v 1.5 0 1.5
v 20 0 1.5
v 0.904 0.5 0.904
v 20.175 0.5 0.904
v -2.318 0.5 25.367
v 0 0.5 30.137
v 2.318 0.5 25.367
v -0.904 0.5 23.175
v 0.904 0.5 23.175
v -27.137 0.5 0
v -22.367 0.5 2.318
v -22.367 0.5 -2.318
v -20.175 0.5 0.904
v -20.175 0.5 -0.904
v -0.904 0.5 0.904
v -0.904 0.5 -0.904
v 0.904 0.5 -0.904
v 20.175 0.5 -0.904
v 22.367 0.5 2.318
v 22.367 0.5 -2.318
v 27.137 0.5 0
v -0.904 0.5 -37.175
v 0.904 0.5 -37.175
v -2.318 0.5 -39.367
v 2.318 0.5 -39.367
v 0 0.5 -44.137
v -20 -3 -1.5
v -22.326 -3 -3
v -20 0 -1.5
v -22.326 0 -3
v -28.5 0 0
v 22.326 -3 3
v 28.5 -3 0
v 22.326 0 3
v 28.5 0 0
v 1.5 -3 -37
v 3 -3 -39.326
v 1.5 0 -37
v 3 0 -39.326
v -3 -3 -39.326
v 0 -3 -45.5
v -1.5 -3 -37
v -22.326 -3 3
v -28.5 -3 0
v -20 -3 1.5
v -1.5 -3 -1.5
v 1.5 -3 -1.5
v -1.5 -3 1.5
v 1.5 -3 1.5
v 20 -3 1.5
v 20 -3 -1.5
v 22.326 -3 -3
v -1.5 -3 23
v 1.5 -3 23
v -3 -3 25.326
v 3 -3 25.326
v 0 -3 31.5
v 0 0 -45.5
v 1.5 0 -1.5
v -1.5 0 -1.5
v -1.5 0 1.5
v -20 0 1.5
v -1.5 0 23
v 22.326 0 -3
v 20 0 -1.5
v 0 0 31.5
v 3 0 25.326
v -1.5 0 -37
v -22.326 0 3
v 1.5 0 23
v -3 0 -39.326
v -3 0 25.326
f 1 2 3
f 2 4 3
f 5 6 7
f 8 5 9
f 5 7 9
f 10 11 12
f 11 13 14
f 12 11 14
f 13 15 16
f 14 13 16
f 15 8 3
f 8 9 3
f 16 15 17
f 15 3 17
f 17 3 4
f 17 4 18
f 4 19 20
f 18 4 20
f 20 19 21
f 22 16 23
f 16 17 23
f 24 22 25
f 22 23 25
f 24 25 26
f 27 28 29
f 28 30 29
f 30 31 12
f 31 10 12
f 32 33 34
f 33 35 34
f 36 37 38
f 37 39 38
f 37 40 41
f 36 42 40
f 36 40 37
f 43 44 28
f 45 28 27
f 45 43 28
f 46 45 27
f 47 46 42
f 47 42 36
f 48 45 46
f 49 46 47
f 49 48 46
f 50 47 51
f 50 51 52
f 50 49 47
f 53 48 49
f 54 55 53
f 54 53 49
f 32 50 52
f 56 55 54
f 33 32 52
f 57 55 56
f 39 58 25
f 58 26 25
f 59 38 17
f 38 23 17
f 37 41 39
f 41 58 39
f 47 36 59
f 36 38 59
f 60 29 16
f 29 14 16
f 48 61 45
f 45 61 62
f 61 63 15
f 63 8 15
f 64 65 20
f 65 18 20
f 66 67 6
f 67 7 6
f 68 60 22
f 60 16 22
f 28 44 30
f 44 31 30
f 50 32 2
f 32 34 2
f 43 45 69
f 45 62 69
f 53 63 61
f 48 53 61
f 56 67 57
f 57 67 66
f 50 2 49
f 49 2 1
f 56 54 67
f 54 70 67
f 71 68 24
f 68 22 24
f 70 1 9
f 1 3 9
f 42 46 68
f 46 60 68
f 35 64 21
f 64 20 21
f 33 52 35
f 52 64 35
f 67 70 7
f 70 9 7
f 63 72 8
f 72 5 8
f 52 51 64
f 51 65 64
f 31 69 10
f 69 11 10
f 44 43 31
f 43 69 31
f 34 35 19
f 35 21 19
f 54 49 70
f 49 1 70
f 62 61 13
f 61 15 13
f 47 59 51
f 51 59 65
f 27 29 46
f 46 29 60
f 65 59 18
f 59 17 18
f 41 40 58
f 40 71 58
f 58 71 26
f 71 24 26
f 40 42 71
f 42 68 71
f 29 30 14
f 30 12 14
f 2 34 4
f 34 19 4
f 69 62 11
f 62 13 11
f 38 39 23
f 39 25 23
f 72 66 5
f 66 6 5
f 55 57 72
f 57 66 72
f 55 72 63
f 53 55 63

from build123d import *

# Parameters (mm, degrees)
F1_DEPTH = 1.5
F2_DEPTH = 0.5
F2_TAPER = 50
F3_DEPTH = 1.5


with BuildPart() as f1:
    # F0 (on Front) → F1 (new body)
    with BuildSketch(Plane.XZ):
        Polygon((-1.5, 1.5), (-20, 1.5), (-22.3259367049, 3), (-28.5, 0), (-22.3259367049, -3), (-20, -1.5), (-1.5, -1.5), (-1.5, -37), (-3, -39.3259400742), (0, -45.5), (3, -39.3259400742), (1.5, -37), (1.5, -1.5), (20, -1.5), (22.3259367049, -3), (28.5, 0), (22.3259367049, 3), (20, 1.5), (1.5, 1.5), (1.5, 23), (3, 25.3259400742), (0, 31.5), (-3, 25.3259400742), (-1.5, 23), align=None)
        Polygon((-1, -1), (-1.5, -1), (-20, -1), (-22.3259367049, -2.5), (-27.4709894508, 0), (-22.3259367049, 2.5), (-20, 1), (-1.5, 1), (-1, 1), (-1, 23), (-2.5, 25.3259400742), (0, 30.4709900124), (2.5, 25.3259400742), (1, 23), (1, 1), (1.5, 1), (20, 1), (22.3259367049, 2.5), (27.4709894508, 0), (22.3259367049, -2.5), (20, -1), (1.5, -1), (1, -1), (1, -37), (2.5, -39.3259400742), (0, -44.4709900124), (-2.5, -39.3259400742), (-1, -37), (-1, -1.5), align=None, mode=Mode.SUBTRACT)
        Polygon((-20, -1), (-1.5, -1), (-1, -1), (-1, -1.5), (-1, -37), (-2.5, -39.3259400742), (0, -44.4709900124), (2.5, -39.3259400742), (1, -37), (1, -1), (1.5, -1), (20, -1), (22.3259367049, -2.5), (27.4709894508, 0), (22.3259367049, 2.5), (20, 1), (1.5, 1), (1, 1), (1, 23), (2.5, 25.3259400742), (0, 30.4709900124), (-2.5, 25.3259400742), (-1, 23), (-1, 1), (-1.5, 1), (-20, 1), (-22.3259367049, 2.5), (-27.4709894508, 0), (-22.3259367049, -2.5), align=None)
    extrude(amount=F1_DEPTH)

    # F0 (on Front) → F2 (join)
    with BuildSketch(Plane.XZ):
        Polygon((-1.5, 1.5), (-20, 1.5), (-22.3259367049, 3), (-28.5, 0), (-22.3259367049, -3), (-20, -1.5), (-1.5, -1.5), (-1.5, -37), (-3, -39.3259400742), (0, -45.5), (3, -39.3259400742), (1.5, -37), (1.5, -1.5), (20, -1.5), (22.3259367049, -3), (28.5, 0), (22.3259367049, 3), (20, 1.5), (1.5, 1.5), (1.5, 23), (3, 25.3259400742), (0, 31.5), (-3, 25.3259400742), (-1.5, 23), align=None)
        Polygon((-1, -1), (-1.5, -1), (-20, -1), (-22.3259367049, -2.5), (-27.4709894508, 0), (-22.3259367049, 2.5), (-20, 1), (-1.5, 1), (-1, 1), (-1, 23), (-2.5, 25.3259400742), (0, 30.4709900124), (2.5, 25.3259400742), (1, 23), (1, 1), (1.5, 1), (20, 1), (22.3259367049, 2.5), (27.4709894508, 0), (22.3259367049, -2.5), (20, -1), (1.5, -1), (1, -1), (1, -37), (2.5, -39.3259400742), (0, -44.4709900124), (-2.5, -39.3259400742), (-1, -37), (-1, -1.5), align=None, mode=Mode.SUBTRACT)
        Polygon((-20, -1), (-1.5, -1), (-1, -1), (-1, -1.5), (-1, -37), (-2.5, -39.3259400742), (0, -44.4709900124), (2.5, -39.3259400742), (1, -37), (1, -1), (1.5, -1), (20, -1), (22.3259367049, -2.5), (27.4709894508, 0), (22.3259367049, 2.5), (20, 1), (1.5, 1), (1, 1), (1, 23), (2.5, 25.3259400742), (0, 30.4709900124), (-2.5, 25.3259400742), (-1, 23), (-1, 1), (-1.5, 1), (-20, 1), (-22.3259367049, 2.5), (-27.4709894508, 0), (-22.3259367049, -2.5), align=None)
    extrude(amount=-F2_DEPTH, taper=F2_TAPER)

    # F3 (add): a face of the model
    f3_faces = [f1.faces().sort_by_distance(p)[0] for p in [
        (0, -1.5, -4.093430874),
    ]]
    extrude(f3_faces, amount=F3_DEPTH)


solid = f1.part
